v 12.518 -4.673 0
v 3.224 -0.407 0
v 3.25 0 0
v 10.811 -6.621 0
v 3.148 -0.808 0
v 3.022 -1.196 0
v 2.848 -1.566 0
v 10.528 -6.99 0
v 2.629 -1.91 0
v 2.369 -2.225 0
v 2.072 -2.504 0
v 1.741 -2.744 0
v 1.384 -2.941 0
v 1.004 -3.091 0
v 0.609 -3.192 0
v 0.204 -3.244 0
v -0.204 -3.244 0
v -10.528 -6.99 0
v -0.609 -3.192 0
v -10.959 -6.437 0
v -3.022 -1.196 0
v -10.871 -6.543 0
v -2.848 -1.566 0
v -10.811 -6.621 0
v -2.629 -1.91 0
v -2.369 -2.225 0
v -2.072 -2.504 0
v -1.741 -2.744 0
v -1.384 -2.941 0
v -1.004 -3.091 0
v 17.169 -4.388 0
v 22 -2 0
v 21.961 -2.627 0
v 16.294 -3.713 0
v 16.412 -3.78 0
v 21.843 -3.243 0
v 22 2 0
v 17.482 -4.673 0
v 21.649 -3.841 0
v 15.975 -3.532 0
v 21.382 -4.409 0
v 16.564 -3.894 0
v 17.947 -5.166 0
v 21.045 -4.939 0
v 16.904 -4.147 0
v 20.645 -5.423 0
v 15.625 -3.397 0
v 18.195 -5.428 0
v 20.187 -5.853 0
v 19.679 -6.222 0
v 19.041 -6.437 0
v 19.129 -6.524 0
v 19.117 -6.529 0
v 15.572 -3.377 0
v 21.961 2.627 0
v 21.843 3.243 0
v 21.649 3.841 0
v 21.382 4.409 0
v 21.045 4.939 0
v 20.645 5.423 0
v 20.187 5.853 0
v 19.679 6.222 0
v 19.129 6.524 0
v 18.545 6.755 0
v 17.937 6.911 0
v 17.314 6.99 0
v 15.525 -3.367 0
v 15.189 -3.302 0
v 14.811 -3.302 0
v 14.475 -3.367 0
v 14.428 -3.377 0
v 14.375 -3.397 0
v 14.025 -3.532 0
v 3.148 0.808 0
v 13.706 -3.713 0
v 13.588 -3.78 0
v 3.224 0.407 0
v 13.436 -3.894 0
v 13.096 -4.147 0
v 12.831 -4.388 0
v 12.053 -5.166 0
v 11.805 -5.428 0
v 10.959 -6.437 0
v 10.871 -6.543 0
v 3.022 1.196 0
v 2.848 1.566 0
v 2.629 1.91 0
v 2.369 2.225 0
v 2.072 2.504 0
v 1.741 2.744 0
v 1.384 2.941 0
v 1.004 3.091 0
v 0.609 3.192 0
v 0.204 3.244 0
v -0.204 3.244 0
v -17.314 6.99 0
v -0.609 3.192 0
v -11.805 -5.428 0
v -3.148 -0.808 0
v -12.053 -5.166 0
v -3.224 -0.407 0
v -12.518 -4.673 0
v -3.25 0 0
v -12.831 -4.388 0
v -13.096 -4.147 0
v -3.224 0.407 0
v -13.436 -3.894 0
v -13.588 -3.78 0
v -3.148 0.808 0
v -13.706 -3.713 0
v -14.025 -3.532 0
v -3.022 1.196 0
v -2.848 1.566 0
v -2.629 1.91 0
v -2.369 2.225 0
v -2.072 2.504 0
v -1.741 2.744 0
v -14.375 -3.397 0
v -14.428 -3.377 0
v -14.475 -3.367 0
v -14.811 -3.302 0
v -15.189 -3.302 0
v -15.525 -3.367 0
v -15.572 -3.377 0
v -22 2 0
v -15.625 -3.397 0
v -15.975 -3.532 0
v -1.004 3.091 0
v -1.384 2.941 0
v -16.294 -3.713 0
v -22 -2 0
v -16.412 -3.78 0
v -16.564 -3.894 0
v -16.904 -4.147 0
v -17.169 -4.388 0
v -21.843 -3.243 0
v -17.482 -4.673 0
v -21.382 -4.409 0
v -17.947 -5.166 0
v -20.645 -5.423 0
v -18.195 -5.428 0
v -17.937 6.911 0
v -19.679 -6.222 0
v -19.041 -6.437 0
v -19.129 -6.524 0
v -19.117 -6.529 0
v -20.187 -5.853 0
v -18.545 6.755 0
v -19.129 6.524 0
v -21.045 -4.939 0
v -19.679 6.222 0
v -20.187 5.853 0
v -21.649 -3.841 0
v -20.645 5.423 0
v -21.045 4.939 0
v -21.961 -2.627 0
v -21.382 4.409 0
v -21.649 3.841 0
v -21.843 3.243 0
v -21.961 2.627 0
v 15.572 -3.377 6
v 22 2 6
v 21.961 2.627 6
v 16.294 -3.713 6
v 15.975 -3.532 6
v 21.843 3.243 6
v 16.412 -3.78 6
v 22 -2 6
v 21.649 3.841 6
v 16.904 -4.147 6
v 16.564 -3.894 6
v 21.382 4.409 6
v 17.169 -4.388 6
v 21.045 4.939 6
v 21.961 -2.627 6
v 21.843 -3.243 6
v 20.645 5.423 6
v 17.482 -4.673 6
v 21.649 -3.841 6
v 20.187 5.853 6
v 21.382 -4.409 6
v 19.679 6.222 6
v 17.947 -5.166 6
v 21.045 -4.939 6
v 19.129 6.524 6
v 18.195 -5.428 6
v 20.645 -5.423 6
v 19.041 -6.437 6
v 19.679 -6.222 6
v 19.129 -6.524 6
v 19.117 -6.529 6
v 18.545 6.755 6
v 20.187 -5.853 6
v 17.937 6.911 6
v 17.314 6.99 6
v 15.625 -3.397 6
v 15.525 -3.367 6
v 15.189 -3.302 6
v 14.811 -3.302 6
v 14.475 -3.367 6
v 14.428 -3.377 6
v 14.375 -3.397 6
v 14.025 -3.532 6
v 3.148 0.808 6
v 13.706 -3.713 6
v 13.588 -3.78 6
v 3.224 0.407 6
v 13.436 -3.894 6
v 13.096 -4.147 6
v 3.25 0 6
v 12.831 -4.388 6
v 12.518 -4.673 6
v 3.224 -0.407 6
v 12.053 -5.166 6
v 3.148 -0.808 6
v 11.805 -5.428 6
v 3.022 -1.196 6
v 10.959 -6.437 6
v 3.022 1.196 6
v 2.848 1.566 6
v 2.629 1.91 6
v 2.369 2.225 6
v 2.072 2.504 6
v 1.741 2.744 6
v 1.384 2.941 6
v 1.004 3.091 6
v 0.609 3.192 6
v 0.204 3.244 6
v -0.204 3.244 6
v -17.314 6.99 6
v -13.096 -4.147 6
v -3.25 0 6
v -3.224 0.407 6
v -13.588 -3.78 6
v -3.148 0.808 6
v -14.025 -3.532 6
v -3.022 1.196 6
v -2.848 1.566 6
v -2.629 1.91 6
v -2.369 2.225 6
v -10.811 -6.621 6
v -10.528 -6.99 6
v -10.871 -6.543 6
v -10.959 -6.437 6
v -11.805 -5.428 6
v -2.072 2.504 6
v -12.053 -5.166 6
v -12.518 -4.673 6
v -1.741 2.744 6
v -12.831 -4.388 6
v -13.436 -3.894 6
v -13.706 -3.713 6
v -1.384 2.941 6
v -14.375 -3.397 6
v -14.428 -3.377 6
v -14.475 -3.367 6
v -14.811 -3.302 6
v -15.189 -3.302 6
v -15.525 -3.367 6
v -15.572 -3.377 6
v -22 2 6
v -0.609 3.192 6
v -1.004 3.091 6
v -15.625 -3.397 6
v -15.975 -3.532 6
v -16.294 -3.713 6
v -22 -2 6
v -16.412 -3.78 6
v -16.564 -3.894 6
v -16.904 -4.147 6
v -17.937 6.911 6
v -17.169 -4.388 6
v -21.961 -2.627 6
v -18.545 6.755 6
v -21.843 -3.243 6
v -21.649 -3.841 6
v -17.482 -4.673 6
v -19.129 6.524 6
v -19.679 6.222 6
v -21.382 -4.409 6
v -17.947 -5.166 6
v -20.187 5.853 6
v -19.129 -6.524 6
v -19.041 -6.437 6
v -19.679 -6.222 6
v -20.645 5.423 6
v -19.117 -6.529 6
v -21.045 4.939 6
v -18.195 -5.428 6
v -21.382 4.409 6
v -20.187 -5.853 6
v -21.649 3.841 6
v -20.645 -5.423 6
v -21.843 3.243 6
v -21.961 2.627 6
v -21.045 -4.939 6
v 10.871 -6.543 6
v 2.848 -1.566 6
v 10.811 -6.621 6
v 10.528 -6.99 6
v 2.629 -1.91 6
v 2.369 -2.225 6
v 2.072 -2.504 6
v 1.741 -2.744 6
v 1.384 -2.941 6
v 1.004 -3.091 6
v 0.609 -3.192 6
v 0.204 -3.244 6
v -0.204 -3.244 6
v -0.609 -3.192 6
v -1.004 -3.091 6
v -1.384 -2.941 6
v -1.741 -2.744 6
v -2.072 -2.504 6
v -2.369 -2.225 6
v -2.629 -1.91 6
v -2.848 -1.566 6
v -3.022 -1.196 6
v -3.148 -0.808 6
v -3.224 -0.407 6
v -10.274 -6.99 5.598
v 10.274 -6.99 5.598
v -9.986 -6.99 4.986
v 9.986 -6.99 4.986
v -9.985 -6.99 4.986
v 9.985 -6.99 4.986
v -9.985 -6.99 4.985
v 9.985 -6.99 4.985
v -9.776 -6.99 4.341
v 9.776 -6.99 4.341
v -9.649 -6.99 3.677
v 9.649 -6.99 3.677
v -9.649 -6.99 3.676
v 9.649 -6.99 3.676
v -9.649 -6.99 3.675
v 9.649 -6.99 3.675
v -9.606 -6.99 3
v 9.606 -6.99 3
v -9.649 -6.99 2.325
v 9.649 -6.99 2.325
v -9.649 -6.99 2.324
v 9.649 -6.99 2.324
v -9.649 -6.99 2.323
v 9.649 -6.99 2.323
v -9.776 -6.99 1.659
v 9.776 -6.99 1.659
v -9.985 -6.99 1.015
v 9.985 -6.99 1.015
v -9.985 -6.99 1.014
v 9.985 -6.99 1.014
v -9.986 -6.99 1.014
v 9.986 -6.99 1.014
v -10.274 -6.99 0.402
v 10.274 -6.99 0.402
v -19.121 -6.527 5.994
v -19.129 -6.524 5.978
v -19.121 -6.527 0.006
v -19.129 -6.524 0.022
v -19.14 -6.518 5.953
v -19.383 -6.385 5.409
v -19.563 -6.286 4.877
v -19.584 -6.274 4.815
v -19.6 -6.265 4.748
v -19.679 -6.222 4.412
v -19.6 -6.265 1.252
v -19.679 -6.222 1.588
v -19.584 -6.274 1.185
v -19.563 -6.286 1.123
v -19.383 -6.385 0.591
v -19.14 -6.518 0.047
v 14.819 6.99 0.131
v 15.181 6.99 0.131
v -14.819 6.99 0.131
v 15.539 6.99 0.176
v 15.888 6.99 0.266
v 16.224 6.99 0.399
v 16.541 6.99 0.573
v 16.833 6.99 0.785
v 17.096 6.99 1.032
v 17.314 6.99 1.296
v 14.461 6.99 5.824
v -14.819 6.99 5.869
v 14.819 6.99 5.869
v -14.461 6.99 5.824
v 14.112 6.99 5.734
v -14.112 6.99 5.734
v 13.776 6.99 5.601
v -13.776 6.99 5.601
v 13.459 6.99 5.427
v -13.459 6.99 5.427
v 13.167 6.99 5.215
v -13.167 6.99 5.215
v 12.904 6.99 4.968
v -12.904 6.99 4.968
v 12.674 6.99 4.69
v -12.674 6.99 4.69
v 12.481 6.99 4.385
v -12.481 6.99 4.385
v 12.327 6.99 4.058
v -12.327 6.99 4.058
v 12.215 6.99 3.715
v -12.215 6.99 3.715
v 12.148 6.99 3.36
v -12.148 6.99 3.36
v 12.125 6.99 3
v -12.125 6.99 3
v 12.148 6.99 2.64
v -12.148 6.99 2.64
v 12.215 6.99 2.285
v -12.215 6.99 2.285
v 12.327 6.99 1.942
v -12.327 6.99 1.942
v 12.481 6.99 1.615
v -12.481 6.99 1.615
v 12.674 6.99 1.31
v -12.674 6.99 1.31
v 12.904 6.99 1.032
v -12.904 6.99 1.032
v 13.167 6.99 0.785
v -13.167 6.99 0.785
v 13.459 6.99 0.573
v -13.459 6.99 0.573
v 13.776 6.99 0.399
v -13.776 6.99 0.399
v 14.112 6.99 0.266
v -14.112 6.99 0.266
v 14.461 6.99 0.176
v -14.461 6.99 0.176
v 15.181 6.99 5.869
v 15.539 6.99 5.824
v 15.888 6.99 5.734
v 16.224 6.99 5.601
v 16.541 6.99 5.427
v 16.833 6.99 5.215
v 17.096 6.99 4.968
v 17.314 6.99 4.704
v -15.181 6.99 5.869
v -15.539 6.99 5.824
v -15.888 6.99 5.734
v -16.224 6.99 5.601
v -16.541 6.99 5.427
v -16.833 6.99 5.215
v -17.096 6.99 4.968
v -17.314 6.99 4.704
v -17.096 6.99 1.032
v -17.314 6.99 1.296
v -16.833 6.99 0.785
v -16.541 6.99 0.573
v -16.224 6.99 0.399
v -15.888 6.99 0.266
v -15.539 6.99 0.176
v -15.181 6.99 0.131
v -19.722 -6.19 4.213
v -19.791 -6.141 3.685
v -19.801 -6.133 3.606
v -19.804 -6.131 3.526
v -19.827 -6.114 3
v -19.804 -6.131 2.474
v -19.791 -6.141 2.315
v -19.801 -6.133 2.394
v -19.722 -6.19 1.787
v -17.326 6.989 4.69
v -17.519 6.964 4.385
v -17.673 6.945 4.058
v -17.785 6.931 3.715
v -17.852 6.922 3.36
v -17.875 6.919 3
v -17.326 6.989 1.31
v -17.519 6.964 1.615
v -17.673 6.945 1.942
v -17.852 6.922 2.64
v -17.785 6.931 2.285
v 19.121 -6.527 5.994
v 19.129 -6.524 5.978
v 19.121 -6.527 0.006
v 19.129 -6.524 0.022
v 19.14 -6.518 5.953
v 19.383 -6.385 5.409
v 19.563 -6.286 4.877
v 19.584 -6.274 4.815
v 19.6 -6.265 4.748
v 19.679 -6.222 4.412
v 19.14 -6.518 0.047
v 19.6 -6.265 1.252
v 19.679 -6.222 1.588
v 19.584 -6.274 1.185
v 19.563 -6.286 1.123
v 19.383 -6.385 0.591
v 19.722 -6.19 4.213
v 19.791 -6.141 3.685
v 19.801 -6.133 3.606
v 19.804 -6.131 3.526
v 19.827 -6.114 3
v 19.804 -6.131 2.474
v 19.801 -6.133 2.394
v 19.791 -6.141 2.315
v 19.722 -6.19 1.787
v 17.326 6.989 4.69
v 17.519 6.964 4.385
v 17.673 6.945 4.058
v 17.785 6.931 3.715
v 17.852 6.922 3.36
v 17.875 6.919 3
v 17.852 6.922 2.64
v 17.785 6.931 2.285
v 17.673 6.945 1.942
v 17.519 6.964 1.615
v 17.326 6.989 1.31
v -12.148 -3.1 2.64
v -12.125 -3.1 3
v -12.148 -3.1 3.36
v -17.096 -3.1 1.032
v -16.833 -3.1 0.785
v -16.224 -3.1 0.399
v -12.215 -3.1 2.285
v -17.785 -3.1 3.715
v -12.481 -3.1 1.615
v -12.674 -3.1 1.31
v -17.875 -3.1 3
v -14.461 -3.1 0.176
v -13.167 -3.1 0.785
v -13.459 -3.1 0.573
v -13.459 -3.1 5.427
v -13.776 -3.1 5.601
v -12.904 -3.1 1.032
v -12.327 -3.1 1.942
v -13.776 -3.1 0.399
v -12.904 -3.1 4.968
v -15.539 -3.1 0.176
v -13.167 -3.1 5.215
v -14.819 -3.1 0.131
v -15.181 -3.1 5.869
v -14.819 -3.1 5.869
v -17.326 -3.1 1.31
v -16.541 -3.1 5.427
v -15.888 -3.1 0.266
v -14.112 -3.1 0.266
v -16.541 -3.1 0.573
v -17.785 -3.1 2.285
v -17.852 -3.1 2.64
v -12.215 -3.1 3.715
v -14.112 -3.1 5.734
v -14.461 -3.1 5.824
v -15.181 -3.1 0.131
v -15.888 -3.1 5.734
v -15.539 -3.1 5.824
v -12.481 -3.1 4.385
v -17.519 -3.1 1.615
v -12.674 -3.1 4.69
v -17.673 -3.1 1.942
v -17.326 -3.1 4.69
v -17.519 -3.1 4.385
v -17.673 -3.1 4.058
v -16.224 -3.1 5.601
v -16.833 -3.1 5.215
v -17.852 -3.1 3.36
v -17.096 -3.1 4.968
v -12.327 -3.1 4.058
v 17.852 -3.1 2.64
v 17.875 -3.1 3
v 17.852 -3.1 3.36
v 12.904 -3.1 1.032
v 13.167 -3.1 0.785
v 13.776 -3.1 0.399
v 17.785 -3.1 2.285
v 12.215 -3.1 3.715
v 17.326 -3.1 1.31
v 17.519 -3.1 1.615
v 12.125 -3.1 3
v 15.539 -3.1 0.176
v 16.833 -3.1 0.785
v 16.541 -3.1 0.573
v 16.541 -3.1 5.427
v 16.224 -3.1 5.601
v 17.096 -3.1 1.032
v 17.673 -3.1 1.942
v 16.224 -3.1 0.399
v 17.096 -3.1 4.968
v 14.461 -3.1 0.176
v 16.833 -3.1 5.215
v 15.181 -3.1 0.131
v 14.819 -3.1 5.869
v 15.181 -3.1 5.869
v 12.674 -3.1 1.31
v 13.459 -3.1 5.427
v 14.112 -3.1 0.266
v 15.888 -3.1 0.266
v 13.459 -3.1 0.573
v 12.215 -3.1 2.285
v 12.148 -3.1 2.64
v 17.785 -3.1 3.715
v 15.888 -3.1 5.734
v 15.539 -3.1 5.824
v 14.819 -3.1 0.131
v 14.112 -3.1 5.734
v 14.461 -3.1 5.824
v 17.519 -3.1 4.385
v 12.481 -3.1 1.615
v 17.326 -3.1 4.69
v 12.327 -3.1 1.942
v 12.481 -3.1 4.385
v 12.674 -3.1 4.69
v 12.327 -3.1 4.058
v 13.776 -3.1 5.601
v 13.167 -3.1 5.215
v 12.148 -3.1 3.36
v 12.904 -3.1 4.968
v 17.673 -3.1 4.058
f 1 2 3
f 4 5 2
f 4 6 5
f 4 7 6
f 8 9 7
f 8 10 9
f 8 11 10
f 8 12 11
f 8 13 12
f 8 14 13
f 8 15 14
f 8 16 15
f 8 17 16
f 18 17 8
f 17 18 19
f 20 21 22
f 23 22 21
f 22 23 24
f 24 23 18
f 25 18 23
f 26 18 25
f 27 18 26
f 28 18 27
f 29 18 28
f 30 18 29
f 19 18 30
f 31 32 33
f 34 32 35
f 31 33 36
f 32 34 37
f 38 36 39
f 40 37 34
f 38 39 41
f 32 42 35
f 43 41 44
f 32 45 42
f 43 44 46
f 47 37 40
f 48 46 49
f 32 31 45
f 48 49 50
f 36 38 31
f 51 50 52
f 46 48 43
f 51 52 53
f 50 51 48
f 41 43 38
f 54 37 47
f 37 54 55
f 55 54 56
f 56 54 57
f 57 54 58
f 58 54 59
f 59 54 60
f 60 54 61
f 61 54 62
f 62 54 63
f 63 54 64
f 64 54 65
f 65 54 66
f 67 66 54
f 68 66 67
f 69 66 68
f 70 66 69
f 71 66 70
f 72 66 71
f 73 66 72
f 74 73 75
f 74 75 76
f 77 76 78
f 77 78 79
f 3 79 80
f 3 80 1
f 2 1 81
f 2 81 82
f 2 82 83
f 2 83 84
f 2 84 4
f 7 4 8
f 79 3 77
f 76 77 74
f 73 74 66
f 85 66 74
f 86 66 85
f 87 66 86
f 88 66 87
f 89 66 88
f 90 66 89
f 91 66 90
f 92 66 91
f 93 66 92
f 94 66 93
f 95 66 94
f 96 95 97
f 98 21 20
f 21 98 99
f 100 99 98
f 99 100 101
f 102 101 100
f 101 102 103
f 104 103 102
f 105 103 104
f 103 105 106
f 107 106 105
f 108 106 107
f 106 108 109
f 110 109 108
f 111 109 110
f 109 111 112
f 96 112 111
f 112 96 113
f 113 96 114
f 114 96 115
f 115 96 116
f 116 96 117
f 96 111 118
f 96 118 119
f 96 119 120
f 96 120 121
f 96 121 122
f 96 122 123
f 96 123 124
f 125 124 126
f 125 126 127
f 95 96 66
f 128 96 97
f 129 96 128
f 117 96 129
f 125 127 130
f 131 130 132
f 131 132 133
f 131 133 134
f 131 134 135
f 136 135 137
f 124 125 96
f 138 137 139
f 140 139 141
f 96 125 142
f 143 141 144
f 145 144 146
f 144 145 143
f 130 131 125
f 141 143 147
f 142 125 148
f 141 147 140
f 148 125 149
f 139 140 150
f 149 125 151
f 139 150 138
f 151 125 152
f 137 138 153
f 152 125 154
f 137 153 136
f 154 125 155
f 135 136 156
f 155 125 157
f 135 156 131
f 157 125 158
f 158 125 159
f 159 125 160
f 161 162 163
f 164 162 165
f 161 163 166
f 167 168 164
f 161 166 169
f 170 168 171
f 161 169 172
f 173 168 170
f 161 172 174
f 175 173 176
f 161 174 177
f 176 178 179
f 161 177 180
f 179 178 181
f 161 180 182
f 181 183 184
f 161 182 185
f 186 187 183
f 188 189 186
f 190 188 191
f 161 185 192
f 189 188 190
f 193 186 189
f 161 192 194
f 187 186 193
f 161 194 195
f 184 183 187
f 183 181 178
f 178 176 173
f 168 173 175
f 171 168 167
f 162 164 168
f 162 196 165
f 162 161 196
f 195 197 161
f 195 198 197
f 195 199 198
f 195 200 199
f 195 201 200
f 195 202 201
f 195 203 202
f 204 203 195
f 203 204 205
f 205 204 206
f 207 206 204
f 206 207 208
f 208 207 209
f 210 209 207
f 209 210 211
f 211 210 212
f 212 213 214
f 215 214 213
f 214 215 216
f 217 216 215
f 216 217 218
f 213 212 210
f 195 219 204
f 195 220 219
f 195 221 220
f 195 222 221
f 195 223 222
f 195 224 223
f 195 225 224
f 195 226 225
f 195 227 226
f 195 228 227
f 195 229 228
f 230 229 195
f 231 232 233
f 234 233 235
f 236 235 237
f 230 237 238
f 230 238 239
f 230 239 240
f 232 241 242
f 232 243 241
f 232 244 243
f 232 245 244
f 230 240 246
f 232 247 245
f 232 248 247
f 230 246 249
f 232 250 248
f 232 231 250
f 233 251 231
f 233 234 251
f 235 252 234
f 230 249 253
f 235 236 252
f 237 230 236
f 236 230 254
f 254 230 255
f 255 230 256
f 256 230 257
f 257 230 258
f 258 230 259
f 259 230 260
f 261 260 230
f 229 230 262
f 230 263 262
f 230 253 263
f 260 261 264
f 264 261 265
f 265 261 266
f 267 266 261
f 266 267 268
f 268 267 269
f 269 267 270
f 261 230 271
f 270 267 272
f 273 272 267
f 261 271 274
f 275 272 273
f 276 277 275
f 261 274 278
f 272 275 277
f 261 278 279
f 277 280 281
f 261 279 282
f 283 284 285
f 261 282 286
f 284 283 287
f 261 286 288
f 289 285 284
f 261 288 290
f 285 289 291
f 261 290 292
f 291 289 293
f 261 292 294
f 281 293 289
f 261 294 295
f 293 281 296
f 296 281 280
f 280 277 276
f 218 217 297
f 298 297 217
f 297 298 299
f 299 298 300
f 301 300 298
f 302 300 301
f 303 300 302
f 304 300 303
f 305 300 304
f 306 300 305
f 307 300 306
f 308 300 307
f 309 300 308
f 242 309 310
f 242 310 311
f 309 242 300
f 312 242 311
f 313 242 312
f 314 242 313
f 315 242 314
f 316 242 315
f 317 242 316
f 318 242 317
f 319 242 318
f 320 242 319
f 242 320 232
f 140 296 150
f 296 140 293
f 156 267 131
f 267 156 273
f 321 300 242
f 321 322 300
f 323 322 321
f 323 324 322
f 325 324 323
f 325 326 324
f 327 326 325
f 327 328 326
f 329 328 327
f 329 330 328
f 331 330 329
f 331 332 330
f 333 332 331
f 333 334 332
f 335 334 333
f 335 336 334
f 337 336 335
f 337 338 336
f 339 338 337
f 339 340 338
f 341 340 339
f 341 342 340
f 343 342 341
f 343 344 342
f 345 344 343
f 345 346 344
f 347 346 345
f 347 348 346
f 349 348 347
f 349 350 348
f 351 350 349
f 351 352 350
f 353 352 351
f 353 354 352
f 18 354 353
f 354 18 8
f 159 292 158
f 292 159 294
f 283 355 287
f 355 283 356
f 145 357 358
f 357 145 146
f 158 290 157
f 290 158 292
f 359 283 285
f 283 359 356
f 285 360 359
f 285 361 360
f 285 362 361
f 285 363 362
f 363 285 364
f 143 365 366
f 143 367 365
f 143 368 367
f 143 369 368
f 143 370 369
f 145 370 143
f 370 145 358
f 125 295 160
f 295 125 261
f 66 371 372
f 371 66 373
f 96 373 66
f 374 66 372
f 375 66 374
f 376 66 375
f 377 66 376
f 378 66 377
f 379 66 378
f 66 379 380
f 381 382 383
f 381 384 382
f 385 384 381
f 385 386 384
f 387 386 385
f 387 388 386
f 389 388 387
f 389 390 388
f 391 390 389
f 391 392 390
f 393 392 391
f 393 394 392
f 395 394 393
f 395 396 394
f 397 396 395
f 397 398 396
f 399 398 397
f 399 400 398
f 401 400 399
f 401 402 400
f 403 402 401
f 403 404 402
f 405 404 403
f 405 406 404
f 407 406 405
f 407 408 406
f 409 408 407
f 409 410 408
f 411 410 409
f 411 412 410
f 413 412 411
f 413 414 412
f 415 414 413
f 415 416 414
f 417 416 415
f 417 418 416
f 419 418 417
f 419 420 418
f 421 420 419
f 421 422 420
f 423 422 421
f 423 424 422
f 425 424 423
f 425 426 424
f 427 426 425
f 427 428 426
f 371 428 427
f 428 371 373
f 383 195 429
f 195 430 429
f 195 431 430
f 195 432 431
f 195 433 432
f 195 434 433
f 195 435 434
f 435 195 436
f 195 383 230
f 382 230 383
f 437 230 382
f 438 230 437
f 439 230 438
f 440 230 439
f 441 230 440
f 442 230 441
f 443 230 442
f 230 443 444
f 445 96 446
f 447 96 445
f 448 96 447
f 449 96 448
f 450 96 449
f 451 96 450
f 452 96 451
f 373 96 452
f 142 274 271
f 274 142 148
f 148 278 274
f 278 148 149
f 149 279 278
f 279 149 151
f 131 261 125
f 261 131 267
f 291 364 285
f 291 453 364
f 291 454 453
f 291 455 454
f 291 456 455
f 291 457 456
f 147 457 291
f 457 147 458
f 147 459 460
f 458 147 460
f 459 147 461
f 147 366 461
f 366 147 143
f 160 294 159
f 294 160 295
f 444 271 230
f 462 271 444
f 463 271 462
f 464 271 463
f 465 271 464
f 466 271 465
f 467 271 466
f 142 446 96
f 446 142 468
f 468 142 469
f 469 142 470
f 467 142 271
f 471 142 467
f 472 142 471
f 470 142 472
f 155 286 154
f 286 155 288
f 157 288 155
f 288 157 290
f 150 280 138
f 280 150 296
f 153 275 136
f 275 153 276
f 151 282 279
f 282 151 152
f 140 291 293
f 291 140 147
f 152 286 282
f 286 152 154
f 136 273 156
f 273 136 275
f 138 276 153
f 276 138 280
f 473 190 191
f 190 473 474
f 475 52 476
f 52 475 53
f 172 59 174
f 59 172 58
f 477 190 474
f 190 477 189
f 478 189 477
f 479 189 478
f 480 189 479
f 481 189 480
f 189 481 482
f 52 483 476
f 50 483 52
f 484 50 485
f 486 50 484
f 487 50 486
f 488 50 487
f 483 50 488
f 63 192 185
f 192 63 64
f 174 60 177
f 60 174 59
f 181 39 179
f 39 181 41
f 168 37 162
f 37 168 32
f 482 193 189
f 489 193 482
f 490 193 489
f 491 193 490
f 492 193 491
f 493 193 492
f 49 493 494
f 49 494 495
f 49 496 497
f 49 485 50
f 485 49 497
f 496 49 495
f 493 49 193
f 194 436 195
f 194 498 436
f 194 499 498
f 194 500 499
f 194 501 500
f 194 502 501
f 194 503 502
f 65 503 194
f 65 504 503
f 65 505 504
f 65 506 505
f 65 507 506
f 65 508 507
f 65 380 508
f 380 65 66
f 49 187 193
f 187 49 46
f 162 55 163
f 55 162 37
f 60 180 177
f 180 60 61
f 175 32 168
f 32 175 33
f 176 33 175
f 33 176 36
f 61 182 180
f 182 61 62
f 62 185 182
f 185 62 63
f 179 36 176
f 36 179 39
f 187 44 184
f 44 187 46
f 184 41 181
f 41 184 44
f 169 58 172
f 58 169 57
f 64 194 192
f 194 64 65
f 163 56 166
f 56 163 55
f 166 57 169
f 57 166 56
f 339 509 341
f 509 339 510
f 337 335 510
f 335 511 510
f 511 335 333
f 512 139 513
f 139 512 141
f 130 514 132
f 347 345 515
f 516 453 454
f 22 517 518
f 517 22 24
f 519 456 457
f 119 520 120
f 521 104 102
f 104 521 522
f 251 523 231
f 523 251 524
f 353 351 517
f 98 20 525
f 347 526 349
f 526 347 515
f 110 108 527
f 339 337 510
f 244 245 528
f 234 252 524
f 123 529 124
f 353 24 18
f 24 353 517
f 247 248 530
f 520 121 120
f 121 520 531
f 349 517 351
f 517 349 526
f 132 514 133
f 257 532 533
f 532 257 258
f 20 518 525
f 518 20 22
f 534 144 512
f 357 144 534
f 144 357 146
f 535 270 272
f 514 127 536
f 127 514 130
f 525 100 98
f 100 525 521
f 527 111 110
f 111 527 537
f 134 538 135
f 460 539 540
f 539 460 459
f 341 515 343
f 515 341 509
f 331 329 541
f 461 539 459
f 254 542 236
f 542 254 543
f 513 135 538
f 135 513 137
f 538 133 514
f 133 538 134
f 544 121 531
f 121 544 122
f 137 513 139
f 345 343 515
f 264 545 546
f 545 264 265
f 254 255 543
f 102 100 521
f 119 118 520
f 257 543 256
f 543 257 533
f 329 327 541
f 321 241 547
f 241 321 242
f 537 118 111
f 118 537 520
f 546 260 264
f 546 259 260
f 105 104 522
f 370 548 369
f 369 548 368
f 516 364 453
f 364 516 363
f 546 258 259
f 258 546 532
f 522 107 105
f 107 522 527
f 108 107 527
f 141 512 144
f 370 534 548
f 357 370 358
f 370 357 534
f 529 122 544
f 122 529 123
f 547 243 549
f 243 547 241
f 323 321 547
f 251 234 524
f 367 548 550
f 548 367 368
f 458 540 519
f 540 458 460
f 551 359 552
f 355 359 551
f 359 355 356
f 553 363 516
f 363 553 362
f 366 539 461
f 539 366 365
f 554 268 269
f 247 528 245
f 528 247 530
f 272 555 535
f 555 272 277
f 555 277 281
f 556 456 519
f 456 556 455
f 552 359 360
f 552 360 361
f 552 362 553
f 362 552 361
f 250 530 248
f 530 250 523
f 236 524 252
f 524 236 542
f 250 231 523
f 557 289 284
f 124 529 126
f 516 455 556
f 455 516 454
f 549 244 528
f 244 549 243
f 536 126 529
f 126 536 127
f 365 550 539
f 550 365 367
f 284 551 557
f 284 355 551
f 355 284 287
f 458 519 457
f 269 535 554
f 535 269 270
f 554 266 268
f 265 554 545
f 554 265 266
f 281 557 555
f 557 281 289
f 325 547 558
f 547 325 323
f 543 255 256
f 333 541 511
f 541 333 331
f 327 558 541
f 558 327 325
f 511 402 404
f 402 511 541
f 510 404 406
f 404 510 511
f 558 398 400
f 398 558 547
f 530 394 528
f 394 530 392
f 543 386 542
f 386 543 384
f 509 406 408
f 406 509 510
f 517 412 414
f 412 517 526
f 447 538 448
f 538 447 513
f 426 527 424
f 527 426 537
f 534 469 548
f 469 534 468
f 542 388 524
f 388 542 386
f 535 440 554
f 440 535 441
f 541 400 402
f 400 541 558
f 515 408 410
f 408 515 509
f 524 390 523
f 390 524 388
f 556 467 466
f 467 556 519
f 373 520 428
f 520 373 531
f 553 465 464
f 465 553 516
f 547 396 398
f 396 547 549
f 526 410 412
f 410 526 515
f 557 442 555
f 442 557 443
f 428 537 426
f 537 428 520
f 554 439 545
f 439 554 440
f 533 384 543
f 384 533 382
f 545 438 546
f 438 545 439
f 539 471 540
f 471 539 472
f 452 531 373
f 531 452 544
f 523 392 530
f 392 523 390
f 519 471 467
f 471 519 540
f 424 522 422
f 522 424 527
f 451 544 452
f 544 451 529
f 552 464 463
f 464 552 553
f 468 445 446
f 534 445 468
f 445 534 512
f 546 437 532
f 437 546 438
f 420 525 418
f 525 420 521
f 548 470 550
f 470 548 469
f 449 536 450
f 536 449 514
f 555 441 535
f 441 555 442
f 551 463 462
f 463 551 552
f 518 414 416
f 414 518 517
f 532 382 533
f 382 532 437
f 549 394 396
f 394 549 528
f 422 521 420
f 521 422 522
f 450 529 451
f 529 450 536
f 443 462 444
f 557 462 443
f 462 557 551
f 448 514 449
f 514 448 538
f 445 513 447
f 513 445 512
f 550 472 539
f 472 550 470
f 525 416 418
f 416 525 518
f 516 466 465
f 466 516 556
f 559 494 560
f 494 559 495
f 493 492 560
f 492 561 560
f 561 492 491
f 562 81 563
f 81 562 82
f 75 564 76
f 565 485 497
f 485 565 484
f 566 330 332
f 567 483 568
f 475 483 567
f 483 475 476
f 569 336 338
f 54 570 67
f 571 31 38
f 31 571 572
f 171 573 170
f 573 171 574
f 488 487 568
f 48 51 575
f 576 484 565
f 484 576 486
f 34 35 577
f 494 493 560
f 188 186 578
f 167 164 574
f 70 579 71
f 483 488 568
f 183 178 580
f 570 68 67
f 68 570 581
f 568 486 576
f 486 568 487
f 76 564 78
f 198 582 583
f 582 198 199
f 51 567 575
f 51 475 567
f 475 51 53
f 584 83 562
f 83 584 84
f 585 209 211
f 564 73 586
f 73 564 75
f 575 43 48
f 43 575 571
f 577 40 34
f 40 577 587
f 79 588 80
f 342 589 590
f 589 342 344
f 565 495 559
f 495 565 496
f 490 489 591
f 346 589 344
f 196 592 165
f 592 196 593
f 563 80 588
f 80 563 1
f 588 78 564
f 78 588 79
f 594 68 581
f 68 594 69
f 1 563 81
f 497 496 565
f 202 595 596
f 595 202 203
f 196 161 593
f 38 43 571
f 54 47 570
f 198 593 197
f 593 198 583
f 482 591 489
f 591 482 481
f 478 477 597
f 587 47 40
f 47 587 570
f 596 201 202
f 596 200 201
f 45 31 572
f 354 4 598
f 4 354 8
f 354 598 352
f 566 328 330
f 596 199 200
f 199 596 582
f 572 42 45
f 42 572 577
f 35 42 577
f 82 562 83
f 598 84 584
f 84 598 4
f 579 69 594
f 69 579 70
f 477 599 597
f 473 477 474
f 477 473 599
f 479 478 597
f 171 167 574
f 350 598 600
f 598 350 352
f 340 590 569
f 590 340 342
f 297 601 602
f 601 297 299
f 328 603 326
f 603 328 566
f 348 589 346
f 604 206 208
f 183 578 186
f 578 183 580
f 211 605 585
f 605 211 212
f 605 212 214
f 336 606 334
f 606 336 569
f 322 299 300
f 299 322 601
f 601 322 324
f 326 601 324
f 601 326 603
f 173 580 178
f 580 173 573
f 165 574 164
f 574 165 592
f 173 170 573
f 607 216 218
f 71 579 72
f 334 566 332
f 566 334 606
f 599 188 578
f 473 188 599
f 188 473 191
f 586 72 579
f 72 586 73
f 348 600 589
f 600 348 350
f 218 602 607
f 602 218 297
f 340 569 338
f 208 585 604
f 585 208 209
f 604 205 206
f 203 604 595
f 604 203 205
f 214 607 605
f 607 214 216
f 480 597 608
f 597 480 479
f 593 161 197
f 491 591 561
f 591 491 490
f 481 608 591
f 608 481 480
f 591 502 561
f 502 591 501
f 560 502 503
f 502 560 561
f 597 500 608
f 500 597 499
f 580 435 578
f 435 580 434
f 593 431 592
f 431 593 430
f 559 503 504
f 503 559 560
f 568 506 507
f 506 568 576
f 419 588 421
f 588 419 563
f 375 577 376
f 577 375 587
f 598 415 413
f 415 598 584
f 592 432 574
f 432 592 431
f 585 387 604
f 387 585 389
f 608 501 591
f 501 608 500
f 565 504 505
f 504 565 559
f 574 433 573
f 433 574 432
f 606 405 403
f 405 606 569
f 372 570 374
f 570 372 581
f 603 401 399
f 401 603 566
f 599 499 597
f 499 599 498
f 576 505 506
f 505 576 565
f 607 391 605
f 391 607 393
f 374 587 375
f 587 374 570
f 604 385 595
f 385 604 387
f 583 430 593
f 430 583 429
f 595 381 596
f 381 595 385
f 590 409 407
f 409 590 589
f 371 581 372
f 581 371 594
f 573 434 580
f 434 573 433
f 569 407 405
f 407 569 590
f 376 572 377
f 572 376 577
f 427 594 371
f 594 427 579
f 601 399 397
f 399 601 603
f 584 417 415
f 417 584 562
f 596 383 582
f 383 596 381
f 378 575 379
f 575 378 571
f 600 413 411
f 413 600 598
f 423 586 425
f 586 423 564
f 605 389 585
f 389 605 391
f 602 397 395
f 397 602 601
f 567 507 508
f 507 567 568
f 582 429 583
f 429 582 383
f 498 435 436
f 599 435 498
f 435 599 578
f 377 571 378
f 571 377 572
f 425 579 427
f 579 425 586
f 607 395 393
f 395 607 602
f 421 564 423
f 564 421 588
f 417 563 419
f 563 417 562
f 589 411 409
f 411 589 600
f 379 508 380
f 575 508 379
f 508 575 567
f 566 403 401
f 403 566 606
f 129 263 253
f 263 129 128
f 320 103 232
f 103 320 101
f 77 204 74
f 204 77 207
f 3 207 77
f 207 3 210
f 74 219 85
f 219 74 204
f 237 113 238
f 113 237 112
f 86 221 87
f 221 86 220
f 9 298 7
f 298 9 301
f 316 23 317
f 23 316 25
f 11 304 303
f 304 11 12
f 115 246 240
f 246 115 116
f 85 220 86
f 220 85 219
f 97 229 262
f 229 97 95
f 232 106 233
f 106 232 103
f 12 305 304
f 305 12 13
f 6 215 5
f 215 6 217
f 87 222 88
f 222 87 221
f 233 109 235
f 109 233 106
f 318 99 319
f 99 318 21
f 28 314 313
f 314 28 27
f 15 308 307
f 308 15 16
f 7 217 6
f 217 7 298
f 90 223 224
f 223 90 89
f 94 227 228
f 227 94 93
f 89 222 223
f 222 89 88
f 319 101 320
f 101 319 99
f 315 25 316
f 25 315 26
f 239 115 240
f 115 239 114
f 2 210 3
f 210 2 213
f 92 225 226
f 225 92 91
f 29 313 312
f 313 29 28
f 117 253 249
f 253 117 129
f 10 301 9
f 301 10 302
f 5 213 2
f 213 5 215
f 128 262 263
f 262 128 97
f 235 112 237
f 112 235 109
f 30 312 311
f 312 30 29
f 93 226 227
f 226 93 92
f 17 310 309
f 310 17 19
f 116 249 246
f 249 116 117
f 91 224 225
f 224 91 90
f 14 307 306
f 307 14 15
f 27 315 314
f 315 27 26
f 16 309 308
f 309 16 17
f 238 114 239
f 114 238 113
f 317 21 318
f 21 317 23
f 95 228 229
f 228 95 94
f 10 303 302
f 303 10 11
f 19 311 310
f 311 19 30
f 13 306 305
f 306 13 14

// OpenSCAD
$fn = 50;


difference() {
	union() {
		cylinder(h = 6, r = 7.0000000000);
		translate(v = [-7.5000000000, 0.0000000000, 0]) {
			hull() {
				translate(v = [-9.5000000000, 2.0000000000, 0]) {
					cylinder(h = 6, r = 5);
				}
				translate(v = [9.5000000000, 2.0000000000, 0]) {
					cylinder(h = 6, r = 5);
				}
				translate(v = [-9.5000000000, -2.0000000000, 0]) {
					cylinder(h = 6, r = 5);
				}
				translate(v = [9.5000000000, -2.0000000000, 0]) {
					cylinder(h = 6, r = 5);
				}
			}
		}
		translate(v = [-7.5000000000, 0.0000000000, 0]) {
			hull() {
				translate(v = [-9.5000000000, 2.0000000000, 0]) {
					cylinder(h = 6, r = 5);
				}
				translate(v = [9.5000000000, 2.0000000000, 0]) {
					cylinder(h = 6, r = 5);
				}
				translate(v = [-9.5000000000, -2.0000000000, 0]) {
					cylinder(h = 6, r = 5);
				}
				translate(v = [9.5000000000, -2.0000000000, 0]) {
					cylinder(h = 6, r = 5);
				}
			}
		}
		translate(v = [7.5000000000, 0.0000000000, 0]) {
			hull() {
				translate(v = [-9.5000000000, 2.0000000000, 0]) {
					cylinder(h = 6, r = 5);
				}
				translate(v = [9.5000000000, 2.0000000000, 0]) {
					cylinder(h = 6, r = 5);
				}
				translate(v = [-9.5000000000, -2.0000000000, 0]) {
					cylinder(h = 6, r = 5);
				}
				translate(v = [9.5000000000, -2.0000000000, 0]) {
					cylinder(h = 6, r = 5);
				}
			}
		}
		translate(v = [7.5000000000, 0.0000000000, 0]) {
			hull() {
				translate(v = [-9.5000000000, 2.0000000000, 0]) {
					cylinder(h = 6, r = 5);
				}
				translate(v = [9.5000000000, 2.0000000000, 0]) {
					cylinder(h = 6, r = 5);
				}
				translate(v = [-9.5000000000, -2.0000000000, 0]) {
					cylinder(h = 6, r = 5);
				}
				translate(v = [9.5000000000, -2.0000000000, 0]) {
					cylinder(h = 6, r = 5);
				}
			}
		}
	}
	union() {
		translate(v = [-15.0000000000, -7.0000000000, 3.0000000000]) {
			rotate(a = [90, 0, 0]) {
				difference() {
					union() {
						#translate(v = [0, 0, -14.0000000000]) {
							cylinder(h = 14, r = 2.6000000000);
						}
						#translate(v = [0, 0, -3.9000000000]) {
							cylinder(h = 3.9000000000, r1 = 2.8750000000, r2 = 5.4000000000);
						}
						#translate(v = [0, 0, -14.0000000000]) {
							cylinder(h = 14, r = 2.8750000000);
						}
						#translate(v = [0, 0, -14.0000000000]) {
							cylinder(h = 14, r = 2.6000000000);
						}
					}
					union();
				}
			}
		}
		translate(v = [15.0000000000, -7.0000000000, 3.0000000000]) {
			rotate(a = [90, 0, 0]) {
				difference() {
					union() {
						#translate(v = [0, 0, -14.0000000000]) {
							cylinder(h = 14, r = 2.6000000000);
						}
						#translate(v = [0, 0, -3.9000000000]) {
							cylinder(h = 3.9000000000, r1 = 2.8750000000, r2 = 5.4000000000);
						}
						#translate(v = [0, 0, -14.0000000000]) {
							cylinder(h = 14, r = 2.8750000000);
						}
						#translate(v = [0, 0, -14.0000000000]) {
							cylinder(h = 14, r = 2.6000000000);
						}
					}
					union();
				}
			}
		}
		translate(v = [0, 0, -100]) {
			cylinder(h = 200, r = 3.2500000000);
		}
		translate(v = [0, 0, -100]) {
			cylinder(h = 200, r = 1.8000000000);
		}
	}
}
